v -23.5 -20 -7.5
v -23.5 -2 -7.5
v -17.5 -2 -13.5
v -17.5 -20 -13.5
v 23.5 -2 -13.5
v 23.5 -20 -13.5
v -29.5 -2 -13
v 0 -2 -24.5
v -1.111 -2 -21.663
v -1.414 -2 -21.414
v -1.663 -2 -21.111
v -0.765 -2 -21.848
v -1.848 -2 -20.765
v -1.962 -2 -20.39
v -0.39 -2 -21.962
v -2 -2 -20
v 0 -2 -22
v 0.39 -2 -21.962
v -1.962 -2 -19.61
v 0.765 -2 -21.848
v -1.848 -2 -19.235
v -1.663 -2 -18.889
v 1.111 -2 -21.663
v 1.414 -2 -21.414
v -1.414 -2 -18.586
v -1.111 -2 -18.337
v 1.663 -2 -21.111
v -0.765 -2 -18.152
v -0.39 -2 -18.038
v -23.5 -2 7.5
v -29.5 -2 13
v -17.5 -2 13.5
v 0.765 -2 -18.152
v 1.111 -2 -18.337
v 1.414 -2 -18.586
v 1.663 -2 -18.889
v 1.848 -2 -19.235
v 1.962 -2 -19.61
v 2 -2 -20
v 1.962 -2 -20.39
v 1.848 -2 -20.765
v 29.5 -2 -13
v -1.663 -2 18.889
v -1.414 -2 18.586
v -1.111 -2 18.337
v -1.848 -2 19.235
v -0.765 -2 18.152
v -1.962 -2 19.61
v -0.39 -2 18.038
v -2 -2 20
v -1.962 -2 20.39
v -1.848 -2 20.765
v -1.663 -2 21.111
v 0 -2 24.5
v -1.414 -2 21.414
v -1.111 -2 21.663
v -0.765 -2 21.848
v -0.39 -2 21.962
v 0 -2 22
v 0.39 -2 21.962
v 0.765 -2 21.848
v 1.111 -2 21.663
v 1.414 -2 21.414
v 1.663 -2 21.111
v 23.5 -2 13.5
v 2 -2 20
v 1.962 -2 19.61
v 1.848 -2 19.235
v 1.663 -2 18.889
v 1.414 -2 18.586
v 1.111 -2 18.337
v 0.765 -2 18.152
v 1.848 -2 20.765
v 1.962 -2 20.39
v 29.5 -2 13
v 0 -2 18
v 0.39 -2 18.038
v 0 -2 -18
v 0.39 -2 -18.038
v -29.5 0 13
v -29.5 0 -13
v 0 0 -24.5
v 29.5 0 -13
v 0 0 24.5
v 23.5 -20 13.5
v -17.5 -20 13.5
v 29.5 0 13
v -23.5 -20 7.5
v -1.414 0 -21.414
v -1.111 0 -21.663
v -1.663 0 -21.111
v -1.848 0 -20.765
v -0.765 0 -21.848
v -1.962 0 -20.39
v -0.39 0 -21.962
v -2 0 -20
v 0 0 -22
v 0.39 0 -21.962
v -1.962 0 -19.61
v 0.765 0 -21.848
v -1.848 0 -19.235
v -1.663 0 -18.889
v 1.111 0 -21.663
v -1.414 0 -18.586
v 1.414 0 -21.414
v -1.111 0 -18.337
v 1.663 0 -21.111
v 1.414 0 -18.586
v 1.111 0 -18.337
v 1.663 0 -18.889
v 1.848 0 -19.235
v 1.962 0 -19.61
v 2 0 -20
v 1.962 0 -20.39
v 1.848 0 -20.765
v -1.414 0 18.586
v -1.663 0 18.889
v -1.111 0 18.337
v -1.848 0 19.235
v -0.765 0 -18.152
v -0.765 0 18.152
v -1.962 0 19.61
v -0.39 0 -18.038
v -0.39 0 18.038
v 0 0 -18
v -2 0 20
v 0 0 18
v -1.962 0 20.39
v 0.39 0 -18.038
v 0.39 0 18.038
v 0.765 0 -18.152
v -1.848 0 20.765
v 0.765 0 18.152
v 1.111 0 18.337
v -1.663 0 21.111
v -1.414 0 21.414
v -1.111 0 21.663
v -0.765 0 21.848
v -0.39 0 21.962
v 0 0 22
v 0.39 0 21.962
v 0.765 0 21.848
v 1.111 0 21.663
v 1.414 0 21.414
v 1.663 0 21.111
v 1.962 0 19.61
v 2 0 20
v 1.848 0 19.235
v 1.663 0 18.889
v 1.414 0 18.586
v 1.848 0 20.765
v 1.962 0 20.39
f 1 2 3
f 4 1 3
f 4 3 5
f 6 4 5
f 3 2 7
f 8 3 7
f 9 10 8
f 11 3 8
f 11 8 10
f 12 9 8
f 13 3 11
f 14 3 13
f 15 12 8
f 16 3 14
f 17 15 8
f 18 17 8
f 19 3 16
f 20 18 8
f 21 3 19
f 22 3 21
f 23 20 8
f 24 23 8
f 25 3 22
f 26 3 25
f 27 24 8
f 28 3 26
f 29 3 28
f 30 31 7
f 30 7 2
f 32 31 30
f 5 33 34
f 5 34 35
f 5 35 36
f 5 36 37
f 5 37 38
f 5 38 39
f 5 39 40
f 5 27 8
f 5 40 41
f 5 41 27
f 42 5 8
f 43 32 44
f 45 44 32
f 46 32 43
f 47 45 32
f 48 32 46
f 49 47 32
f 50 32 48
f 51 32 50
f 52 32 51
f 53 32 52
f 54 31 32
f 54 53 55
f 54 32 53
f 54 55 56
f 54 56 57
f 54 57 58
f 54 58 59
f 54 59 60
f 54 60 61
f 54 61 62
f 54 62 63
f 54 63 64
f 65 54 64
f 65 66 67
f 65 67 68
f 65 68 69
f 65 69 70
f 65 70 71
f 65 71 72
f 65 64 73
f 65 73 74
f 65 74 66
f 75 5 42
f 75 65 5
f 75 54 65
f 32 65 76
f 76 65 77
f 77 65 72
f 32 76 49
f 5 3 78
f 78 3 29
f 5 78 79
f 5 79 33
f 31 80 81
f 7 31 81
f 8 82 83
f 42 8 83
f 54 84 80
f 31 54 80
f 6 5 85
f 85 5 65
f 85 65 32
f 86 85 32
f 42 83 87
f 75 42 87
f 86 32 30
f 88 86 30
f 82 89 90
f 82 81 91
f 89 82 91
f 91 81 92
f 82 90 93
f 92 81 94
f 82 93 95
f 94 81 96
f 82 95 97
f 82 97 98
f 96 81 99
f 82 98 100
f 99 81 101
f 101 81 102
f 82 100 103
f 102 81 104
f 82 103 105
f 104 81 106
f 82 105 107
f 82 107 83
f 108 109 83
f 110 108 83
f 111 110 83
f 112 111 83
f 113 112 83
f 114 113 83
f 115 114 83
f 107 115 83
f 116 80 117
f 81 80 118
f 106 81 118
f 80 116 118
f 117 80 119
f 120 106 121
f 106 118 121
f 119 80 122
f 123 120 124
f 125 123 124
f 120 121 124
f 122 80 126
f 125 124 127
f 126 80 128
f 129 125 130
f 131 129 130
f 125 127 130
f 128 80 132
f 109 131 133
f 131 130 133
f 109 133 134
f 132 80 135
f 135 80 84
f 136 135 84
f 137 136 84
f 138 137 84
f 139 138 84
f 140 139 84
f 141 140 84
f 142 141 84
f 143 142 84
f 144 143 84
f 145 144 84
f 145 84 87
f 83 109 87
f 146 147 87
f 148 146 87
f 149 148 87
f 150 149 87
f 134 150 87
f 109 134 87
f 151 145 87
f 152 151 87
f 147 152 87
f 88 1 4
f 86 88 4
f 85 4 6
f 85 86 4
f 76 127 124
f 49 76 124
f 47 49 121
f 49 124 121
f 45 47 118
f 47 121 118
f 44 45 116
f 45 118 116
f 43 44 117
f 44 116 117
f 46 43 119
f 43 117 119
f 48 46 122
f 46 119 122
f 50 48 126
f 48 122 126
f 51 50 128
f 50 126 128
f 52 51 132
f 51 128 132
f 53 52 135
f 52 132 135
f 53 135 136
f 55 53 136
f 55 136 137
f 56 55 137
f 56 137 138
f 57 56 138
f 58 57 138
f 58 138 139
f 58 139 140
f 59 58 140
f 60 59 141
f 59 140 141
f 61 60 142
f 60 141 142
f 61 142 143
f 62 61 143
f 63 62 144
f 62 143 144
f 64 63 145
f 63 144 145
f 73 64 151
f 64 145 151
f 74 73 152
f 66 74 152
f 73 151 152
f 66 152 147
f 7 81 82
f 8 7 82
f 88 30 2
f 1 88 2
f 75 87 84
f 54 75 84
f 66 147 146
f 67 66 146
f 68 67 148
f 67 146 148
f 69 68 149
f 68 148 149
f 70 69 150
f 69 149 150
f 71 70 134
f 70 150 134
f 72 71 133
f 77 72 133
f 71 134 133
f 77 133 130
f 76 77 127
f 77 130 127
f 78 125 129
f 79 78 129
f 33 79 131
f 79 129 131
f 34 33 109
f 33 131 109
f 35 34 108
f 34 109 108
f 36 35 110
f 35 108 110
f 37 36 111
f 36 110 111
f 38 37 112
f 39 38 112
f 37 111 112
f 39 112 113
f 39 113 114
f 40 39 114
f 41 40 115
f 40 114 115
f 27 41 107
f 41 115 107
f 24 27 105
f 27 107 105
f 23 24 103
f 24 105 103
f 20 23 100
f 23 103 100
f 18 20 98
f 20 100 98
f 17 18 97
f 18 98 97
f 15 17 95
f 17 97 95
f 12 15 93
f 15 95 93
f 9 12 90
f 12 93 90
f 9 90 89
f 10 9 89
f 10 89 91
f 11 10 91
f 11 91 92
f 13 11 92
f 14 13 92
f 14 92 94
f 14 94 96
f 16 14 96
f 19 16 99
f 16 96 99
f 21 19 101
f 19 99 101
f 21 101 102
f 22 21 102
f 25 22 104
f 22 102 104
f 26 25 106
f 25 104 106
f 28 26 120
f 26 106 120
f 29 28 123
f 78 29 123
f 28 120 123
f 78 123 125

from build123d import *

# Parameters (mm, degrees)
F1_DEPTH = 2
F0_W     = 23.5
F0_H     = 27
F2_DEPTH = 20


with BuildPart() as f1:
    # F0 (on Front) → F1 (new body)
    with BuildSketch(Plane.XZ):
        Polygon((0, 24.5), (-29.5, 13), (-29.5, -13), (0, -24.5), (29.5, -13), (29.5, 13), align=None)
        with BuildLine():
            ThreePointArc((2, -20), (-1.414214, -21.414214), (0, -18))
            ThreePointArc((0, -18), (1.414214, -18.585786), (2, -20))
        make_face(mode=Mode.SUBTRACT)
        Polygon((-17.5, 13.5), (0, 13.5), (23.5, 13.5), (23.5, -13.5), (0, -13.5), (-17.5, -13.5), (-23.5, -7.5), (-23.5, 7.5), align=None, mode=Mode.SUBTRACT)
        with BuildLine():
            ThreePointArc((0, 18), (-1.414214, 21.414214), (2, 20))
            ThreePointArc((2, 20), (1.414214, 18.585786), (0, 18))
        make_face(mode=Mode.SUBTRACT)
    extrude(amount=F1_DEPTH)

    # F0 (on Front) → F2 (join)
    with BuildSketch(Plane.XZ):
        Polygon((0, -13.5), (0, 13.5), (-17.5, 13.5), (-23.5, 7.5), (-23.5, -7.5), (-17.5, -13.5), align=None)
        with Locations((11.75, 0)):
            Rectangle(F0_W, F0_H)
    extrude(amount=F2_DEPTH)


solid = f1.part
